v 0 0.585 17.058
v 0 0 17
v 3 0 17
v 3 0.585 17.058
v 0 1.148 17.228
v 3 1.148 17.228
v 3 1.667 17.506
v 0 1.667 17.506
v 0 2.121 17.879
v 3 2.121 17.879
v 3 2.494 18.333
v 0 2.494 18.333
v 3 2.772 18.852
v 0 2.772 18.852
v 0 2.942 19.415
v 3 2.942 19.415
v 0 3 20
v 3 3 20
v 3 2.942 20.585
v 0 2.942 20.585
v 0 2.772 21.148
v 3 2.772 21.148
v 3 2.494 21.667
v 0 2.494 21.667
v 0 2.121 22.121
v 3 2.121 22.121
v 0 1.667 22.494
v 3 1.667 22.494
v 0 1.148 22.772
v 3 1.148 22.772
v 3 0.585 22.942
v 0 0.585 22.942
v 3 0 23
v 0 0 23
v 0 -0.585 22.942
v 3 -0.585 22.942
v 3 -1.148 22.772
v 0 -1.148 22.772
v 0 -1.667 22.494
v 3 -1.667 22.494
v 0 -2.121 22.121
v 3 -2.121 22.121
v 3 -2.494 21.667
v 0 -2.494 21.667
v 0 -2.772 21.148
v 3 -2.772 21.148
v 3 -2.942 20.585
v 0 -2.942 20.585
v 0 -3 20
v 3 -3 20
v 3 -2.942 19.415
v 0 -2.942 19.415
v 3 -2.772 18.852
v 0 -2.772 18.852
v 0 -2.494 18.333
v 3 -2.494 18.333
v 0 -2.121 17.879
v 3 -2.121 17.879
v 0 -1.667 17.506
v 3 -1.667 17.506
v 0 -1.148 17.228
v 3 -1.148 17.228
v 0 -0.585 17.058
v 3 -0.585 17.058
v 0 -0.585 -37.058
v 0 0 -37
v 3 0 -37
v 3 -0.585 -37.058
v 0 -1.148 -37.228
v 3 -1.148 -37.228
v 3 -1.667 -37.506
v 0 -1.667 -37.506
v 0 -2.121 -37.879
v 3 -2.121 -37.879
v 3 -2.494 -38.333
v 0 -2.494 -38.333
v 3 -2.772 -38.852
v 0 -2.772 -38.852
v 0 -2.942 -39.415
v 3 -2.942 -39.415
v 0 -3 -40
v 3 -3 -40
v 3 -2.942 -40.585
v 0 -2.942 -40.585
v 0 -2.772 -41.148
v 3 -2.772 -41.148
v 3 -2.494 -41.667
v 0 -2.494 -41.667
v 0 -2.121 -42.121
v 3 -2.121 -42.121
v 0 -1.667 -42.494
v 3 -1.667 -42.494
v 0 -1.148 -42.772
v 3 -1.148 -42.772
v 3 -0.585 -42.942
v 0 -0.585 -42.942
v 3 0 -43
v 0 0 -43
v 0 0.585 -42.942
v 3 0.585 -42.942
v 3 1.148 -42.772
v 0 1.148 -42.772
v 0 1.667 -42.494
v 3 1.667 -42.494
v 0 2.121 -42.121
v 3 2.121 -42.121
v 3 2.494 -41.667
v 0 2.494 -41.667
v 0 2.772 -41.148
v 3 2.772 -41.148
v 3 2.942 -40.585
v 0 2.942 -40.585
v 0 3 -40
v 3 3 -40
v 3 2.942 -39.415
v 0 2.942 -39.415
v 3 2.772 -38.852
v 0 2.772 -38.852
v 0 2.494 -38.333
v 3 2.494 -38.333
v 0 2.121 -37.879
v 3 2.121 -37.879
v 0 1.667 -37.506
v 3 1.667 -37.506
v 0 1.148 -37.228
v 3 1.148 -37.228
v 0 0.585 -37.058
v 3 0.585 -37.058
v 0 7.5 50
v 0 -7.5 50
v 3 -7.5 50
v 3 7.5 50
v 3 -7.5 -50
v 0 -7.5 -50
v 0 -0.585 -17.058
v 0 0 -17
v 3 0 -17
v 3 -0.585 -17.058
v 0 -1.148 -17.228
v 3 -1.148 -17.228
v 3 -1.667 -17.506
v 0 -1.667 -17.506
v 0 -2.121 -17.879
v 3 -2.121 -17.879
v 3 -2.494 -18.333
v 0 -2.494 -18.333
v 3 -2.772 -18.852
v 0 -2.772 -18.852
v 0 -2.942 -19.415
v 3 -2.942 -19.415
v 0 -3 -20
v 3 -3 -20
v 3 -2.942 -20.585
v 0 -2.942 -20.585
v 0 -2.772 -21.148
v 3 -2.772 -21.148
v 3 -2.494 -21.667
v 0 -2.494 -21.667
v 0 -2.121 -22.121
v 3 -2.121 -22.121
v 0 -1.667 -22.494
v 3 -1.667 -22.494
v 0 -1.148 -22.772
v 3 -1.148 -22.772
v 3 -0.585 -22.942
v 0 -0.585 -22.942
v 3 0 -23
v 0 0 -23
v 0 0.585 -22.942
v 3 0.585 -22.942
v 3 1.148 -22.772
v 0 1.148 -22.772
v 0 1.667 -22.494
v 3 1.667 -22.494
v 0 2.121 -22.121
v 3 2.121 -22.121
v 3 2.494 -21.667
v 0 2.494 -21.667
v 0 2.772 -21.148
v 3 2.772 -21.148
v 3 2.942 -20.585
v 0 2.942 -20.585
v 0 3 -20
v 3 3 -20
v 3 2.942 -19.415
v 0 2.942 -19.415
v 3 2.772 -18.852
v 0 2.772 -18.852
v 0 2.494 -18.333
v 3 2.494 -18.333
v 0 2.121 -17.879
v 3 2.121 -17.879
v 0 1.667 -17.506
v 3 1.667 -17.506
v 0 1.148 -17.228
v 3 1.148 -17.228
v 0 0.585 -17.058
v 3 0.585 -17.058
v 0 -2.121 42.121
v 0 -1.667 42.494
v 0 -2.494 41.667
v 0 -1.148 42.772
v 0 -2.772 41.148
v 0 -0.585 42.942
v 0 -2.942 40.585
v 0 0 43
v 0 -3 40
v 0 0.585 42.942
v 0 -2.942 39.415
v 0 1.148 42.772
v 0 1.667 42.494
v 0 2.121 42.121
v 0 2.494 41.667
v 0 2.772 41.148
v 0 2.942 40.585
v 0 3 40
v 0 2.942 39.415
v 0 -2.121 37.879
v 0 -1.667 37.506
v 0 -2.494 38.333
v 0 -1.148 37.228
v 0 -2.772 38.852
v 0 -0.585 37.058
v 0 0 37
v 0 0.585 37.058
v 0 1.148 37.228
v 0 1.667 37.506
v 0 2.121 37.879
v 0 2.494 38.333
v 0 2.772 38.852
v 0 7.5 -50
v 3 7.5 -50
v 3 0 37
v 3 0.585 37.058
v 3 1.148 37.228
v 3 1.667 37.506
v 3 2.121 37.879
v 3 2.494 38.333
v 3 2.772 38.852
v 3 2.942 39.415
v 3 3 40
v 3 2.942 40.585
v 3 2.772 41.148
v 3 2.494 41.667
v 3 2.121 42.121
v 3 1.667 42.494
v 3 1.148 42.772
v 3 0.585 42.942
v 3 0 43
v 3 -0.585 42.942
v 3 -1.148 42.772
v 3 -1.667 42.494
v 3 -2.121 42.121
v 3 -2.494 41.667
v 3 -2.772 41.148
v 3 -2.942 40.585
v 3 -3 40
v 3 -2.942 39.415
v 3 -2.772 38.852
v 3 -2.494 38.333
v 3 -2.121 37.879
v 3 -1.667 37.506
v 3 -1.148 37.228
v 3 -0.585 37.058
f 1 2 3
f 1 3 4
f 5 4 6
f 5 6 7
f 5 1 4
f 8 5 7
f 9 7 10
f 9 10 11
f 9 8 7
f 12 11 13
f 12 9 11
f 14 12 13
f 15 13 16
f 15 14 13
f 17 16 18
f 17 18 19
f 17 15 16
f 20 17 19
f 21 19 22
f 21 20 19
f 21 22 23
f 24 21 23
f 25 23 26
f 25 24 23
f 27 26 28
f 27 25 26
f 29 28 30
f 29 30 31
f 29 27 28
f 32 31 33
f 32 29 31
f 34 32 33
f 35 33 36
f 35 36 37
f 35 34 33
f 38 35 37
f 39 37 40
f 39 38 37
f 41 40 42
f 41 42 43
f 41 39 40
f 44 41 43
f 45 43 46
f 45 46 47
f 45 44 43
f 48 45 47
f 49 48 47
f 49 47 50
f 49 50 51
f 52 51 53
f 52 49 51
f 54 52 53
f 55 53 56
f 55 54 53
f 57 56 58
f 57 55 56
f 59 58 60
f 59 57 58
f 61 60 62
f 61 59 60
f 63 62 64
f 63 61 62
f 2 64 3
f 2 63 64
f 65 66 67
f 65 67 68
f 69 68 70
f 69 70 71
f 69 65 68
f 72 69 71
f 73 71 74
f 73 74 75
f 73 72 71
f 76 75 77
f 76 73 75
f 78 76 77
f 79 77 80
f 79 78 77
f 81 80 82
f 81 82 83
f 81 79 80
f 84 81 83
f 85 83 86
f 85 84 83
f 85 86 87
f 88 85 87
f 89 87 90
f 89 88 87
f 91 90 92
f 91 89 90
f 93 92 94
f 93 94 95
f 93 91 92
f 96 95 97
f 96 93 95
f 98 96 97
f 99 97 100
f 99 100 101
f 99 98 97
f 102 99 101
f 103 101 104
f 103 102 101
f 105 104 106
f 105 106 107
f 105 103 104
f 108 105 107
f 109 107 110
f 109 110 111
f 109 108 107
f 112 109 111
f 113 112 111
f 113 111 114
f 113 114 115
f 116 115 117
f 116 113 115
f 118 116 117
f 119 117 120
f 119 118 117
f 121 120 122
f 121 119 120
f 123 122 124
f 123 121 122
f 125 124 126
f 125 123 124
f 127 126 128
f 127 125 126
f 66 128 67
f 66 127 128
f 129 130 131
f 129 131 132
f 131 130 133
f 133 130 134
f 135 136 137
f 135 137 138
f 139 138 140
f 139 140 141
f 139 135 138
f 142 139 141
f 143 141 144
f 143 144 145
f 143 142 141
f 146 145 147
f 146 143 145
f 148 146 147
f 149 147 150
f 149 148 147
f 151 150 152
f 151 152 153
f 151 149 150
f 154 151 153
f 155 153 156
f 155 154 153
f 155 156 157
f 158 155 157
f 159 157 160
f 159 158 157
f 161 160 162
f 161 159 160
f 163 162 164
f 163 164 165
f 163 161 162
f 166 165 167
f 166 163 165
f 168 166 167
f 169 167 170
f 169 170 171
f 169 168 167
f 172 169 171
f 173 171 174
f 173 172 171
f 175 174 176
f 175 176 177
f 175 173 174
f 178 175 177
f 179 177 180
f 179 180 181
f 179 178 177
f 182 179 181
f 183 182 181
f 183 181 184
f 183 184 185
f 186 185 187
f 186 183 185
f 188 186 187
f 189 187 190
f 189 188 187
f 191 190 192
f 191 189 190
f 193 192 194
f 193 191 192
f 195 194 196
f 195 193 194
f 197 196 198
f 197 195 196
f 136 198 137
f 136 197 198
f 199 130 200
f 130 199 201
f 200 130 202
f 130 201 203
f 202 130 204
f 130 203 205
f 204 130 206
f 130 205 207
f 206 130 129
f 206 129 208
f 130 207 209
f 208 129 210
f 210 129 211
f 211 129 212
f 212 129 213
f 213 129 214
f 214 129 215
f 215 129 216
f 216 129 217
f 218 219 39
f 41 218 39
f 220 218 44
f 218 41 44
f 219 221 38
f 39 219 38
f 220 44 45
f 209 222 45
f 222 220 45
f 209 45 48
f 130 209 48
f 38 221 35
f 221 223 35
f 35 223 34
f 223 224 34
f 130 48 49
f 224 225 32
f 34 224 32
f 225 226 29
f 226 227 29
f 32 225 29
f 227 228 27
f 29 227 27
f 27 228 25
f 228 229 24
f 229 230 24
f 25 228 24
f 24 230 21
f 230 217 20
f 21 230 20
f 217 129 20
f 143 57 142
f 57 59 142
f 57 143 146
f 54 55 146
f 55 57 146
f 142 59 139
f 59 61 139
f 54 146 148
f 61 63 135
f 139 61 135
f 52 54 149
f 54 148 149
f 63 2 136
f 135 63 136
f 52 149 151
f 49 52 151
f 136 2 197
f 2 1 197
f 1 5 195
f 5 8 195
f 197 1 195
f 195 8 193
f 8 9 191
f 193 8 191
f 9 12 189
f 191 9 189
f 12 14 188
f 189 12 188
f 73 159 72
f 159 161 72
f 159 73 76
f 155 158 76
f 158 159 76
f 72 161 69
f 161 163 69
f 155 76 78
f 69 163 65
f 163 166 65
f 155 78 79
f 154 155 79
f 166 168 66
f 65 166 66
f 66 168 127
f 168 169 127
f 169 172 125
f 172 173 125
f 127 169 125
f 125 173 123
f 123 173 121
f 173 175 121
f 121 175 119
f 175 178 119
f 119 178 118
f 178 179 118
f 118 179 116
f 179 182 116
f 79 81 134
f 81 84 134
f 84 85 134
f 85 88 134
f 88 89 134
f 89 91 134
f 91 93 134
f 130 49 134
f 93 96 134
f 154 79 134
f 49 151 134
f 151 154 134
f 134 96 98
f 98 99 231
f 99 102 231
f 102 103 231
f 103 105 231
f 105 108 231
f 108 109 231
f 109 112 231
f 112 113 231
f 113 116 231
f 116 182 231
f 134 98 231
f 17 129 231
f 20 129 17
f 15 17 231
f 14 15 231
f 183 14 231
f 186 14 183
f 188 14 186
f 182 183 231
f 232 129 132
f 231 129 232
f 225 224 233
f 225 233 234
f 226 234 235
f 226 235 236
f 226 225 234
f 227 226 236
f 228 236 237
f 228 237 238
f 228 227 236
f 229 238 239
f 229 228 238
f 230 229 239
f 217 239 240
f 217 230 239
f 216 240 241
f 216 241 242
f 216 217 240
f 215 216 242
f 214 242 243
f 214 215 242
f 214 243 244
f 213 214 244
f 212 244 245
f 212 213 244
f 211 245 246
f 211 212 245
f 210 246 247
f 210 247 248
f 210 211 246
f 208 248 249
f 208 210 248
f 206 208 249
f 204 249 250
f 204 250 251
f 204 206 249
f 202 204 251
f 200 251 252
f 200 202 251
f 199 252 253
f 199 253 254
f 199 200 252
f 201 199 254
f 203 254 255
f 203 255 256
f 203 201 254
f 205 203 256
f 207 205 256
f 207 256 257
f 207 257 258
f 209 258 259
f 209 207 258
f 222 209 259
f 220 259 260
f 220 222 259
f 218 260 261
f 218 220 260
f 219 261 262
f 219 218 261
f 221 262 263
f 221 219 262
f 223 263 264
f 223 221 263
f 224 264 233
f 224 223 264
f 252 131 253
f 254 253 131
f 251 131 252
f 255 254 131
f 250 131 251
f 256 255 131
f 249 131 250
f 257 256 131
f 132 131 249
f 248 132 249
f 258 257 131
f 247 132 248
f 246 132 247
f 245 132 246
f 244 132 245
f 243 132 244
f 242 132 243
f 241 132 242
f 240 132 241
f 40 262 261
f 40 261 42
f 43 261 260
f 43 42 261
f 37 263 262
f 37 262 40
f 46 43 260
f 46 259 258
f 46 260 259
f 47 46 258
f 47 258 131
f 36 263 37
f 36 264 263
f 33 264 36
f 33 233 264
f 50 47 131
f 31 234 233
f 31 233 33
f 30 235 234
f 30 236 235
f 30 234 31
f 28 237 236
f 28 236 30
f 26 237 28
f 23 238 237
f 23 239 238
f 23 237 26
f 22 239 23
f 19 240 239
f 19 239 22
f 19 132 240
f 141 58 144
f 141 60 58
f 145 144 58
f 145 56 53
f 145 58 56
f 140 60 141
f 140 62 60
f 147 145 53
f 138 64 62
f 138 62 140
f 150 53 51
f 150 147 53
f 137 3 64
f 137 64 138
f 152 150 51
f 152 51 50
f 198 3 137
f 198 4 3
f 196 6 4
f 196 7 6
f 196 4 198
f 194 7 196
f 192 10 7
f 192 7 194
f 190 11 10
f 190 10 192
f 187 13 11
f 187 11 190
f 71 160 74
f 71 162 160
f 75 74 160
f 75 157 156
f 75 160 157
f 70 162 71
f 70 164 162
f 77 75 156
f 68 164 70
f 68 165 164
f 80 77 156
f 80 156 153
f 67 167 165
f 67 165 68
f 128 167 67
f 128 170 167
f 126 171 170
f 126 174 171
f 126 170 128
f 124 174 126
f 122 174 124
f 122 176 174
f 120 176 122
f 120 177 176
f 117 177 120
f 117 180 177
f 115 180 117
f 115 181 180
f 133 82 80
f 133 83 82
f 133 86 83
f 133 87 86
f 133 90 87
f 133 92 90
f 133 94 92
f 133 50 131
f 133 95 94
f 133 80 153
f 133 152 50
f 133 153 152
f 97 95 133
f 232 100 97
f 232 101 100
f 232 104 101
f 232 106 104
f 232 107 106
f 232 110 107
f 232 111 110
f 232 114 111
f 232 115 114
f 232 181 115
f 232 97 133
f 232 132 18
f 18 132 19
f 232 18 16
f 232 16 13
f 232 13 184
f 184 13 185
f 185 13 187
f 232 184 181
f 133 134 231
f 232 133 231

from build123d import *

# Parameters (mm, degrees)
SKETCH_1_W      = 100
SKETCH_1_H      = 15
SKETCH_1_R      = 3
EXTRUDE_1_DEPTH = 3


with BuildPart() as part:
    # Эскиз1 → Бобышка-Вытянуть1 (new body)
    with BuildSketch(Plane(origin=(0, 0, 0), x_dir=(0, 0, -1), z_dir=(1, 0, 0))):
        Rectangle(SKETCH_1_W, SKETCH_1_H)
        with Locations((-40, 0)):
            Circle(SKETCH_1_R, mode=Mode.SUBTRACT)
        with Locations((-20, 0)):
            Circle(SKETCH_1_R, mode=Mode.SUBTRACT)
        with Locations(Location((20, 0, 0), (0, 0, 180))):
            Circle(SKETCH_1_R, mode=Mode.SUBTRACT)
        with Locations(Location((40, 0, 0), (0, 0, 180))):
            Circle(SKETCH_1_R, mode=Mode.SUBTRACT)
    extrude(amount=EXTRUDE_1_DEPTH)


solid = part.part
